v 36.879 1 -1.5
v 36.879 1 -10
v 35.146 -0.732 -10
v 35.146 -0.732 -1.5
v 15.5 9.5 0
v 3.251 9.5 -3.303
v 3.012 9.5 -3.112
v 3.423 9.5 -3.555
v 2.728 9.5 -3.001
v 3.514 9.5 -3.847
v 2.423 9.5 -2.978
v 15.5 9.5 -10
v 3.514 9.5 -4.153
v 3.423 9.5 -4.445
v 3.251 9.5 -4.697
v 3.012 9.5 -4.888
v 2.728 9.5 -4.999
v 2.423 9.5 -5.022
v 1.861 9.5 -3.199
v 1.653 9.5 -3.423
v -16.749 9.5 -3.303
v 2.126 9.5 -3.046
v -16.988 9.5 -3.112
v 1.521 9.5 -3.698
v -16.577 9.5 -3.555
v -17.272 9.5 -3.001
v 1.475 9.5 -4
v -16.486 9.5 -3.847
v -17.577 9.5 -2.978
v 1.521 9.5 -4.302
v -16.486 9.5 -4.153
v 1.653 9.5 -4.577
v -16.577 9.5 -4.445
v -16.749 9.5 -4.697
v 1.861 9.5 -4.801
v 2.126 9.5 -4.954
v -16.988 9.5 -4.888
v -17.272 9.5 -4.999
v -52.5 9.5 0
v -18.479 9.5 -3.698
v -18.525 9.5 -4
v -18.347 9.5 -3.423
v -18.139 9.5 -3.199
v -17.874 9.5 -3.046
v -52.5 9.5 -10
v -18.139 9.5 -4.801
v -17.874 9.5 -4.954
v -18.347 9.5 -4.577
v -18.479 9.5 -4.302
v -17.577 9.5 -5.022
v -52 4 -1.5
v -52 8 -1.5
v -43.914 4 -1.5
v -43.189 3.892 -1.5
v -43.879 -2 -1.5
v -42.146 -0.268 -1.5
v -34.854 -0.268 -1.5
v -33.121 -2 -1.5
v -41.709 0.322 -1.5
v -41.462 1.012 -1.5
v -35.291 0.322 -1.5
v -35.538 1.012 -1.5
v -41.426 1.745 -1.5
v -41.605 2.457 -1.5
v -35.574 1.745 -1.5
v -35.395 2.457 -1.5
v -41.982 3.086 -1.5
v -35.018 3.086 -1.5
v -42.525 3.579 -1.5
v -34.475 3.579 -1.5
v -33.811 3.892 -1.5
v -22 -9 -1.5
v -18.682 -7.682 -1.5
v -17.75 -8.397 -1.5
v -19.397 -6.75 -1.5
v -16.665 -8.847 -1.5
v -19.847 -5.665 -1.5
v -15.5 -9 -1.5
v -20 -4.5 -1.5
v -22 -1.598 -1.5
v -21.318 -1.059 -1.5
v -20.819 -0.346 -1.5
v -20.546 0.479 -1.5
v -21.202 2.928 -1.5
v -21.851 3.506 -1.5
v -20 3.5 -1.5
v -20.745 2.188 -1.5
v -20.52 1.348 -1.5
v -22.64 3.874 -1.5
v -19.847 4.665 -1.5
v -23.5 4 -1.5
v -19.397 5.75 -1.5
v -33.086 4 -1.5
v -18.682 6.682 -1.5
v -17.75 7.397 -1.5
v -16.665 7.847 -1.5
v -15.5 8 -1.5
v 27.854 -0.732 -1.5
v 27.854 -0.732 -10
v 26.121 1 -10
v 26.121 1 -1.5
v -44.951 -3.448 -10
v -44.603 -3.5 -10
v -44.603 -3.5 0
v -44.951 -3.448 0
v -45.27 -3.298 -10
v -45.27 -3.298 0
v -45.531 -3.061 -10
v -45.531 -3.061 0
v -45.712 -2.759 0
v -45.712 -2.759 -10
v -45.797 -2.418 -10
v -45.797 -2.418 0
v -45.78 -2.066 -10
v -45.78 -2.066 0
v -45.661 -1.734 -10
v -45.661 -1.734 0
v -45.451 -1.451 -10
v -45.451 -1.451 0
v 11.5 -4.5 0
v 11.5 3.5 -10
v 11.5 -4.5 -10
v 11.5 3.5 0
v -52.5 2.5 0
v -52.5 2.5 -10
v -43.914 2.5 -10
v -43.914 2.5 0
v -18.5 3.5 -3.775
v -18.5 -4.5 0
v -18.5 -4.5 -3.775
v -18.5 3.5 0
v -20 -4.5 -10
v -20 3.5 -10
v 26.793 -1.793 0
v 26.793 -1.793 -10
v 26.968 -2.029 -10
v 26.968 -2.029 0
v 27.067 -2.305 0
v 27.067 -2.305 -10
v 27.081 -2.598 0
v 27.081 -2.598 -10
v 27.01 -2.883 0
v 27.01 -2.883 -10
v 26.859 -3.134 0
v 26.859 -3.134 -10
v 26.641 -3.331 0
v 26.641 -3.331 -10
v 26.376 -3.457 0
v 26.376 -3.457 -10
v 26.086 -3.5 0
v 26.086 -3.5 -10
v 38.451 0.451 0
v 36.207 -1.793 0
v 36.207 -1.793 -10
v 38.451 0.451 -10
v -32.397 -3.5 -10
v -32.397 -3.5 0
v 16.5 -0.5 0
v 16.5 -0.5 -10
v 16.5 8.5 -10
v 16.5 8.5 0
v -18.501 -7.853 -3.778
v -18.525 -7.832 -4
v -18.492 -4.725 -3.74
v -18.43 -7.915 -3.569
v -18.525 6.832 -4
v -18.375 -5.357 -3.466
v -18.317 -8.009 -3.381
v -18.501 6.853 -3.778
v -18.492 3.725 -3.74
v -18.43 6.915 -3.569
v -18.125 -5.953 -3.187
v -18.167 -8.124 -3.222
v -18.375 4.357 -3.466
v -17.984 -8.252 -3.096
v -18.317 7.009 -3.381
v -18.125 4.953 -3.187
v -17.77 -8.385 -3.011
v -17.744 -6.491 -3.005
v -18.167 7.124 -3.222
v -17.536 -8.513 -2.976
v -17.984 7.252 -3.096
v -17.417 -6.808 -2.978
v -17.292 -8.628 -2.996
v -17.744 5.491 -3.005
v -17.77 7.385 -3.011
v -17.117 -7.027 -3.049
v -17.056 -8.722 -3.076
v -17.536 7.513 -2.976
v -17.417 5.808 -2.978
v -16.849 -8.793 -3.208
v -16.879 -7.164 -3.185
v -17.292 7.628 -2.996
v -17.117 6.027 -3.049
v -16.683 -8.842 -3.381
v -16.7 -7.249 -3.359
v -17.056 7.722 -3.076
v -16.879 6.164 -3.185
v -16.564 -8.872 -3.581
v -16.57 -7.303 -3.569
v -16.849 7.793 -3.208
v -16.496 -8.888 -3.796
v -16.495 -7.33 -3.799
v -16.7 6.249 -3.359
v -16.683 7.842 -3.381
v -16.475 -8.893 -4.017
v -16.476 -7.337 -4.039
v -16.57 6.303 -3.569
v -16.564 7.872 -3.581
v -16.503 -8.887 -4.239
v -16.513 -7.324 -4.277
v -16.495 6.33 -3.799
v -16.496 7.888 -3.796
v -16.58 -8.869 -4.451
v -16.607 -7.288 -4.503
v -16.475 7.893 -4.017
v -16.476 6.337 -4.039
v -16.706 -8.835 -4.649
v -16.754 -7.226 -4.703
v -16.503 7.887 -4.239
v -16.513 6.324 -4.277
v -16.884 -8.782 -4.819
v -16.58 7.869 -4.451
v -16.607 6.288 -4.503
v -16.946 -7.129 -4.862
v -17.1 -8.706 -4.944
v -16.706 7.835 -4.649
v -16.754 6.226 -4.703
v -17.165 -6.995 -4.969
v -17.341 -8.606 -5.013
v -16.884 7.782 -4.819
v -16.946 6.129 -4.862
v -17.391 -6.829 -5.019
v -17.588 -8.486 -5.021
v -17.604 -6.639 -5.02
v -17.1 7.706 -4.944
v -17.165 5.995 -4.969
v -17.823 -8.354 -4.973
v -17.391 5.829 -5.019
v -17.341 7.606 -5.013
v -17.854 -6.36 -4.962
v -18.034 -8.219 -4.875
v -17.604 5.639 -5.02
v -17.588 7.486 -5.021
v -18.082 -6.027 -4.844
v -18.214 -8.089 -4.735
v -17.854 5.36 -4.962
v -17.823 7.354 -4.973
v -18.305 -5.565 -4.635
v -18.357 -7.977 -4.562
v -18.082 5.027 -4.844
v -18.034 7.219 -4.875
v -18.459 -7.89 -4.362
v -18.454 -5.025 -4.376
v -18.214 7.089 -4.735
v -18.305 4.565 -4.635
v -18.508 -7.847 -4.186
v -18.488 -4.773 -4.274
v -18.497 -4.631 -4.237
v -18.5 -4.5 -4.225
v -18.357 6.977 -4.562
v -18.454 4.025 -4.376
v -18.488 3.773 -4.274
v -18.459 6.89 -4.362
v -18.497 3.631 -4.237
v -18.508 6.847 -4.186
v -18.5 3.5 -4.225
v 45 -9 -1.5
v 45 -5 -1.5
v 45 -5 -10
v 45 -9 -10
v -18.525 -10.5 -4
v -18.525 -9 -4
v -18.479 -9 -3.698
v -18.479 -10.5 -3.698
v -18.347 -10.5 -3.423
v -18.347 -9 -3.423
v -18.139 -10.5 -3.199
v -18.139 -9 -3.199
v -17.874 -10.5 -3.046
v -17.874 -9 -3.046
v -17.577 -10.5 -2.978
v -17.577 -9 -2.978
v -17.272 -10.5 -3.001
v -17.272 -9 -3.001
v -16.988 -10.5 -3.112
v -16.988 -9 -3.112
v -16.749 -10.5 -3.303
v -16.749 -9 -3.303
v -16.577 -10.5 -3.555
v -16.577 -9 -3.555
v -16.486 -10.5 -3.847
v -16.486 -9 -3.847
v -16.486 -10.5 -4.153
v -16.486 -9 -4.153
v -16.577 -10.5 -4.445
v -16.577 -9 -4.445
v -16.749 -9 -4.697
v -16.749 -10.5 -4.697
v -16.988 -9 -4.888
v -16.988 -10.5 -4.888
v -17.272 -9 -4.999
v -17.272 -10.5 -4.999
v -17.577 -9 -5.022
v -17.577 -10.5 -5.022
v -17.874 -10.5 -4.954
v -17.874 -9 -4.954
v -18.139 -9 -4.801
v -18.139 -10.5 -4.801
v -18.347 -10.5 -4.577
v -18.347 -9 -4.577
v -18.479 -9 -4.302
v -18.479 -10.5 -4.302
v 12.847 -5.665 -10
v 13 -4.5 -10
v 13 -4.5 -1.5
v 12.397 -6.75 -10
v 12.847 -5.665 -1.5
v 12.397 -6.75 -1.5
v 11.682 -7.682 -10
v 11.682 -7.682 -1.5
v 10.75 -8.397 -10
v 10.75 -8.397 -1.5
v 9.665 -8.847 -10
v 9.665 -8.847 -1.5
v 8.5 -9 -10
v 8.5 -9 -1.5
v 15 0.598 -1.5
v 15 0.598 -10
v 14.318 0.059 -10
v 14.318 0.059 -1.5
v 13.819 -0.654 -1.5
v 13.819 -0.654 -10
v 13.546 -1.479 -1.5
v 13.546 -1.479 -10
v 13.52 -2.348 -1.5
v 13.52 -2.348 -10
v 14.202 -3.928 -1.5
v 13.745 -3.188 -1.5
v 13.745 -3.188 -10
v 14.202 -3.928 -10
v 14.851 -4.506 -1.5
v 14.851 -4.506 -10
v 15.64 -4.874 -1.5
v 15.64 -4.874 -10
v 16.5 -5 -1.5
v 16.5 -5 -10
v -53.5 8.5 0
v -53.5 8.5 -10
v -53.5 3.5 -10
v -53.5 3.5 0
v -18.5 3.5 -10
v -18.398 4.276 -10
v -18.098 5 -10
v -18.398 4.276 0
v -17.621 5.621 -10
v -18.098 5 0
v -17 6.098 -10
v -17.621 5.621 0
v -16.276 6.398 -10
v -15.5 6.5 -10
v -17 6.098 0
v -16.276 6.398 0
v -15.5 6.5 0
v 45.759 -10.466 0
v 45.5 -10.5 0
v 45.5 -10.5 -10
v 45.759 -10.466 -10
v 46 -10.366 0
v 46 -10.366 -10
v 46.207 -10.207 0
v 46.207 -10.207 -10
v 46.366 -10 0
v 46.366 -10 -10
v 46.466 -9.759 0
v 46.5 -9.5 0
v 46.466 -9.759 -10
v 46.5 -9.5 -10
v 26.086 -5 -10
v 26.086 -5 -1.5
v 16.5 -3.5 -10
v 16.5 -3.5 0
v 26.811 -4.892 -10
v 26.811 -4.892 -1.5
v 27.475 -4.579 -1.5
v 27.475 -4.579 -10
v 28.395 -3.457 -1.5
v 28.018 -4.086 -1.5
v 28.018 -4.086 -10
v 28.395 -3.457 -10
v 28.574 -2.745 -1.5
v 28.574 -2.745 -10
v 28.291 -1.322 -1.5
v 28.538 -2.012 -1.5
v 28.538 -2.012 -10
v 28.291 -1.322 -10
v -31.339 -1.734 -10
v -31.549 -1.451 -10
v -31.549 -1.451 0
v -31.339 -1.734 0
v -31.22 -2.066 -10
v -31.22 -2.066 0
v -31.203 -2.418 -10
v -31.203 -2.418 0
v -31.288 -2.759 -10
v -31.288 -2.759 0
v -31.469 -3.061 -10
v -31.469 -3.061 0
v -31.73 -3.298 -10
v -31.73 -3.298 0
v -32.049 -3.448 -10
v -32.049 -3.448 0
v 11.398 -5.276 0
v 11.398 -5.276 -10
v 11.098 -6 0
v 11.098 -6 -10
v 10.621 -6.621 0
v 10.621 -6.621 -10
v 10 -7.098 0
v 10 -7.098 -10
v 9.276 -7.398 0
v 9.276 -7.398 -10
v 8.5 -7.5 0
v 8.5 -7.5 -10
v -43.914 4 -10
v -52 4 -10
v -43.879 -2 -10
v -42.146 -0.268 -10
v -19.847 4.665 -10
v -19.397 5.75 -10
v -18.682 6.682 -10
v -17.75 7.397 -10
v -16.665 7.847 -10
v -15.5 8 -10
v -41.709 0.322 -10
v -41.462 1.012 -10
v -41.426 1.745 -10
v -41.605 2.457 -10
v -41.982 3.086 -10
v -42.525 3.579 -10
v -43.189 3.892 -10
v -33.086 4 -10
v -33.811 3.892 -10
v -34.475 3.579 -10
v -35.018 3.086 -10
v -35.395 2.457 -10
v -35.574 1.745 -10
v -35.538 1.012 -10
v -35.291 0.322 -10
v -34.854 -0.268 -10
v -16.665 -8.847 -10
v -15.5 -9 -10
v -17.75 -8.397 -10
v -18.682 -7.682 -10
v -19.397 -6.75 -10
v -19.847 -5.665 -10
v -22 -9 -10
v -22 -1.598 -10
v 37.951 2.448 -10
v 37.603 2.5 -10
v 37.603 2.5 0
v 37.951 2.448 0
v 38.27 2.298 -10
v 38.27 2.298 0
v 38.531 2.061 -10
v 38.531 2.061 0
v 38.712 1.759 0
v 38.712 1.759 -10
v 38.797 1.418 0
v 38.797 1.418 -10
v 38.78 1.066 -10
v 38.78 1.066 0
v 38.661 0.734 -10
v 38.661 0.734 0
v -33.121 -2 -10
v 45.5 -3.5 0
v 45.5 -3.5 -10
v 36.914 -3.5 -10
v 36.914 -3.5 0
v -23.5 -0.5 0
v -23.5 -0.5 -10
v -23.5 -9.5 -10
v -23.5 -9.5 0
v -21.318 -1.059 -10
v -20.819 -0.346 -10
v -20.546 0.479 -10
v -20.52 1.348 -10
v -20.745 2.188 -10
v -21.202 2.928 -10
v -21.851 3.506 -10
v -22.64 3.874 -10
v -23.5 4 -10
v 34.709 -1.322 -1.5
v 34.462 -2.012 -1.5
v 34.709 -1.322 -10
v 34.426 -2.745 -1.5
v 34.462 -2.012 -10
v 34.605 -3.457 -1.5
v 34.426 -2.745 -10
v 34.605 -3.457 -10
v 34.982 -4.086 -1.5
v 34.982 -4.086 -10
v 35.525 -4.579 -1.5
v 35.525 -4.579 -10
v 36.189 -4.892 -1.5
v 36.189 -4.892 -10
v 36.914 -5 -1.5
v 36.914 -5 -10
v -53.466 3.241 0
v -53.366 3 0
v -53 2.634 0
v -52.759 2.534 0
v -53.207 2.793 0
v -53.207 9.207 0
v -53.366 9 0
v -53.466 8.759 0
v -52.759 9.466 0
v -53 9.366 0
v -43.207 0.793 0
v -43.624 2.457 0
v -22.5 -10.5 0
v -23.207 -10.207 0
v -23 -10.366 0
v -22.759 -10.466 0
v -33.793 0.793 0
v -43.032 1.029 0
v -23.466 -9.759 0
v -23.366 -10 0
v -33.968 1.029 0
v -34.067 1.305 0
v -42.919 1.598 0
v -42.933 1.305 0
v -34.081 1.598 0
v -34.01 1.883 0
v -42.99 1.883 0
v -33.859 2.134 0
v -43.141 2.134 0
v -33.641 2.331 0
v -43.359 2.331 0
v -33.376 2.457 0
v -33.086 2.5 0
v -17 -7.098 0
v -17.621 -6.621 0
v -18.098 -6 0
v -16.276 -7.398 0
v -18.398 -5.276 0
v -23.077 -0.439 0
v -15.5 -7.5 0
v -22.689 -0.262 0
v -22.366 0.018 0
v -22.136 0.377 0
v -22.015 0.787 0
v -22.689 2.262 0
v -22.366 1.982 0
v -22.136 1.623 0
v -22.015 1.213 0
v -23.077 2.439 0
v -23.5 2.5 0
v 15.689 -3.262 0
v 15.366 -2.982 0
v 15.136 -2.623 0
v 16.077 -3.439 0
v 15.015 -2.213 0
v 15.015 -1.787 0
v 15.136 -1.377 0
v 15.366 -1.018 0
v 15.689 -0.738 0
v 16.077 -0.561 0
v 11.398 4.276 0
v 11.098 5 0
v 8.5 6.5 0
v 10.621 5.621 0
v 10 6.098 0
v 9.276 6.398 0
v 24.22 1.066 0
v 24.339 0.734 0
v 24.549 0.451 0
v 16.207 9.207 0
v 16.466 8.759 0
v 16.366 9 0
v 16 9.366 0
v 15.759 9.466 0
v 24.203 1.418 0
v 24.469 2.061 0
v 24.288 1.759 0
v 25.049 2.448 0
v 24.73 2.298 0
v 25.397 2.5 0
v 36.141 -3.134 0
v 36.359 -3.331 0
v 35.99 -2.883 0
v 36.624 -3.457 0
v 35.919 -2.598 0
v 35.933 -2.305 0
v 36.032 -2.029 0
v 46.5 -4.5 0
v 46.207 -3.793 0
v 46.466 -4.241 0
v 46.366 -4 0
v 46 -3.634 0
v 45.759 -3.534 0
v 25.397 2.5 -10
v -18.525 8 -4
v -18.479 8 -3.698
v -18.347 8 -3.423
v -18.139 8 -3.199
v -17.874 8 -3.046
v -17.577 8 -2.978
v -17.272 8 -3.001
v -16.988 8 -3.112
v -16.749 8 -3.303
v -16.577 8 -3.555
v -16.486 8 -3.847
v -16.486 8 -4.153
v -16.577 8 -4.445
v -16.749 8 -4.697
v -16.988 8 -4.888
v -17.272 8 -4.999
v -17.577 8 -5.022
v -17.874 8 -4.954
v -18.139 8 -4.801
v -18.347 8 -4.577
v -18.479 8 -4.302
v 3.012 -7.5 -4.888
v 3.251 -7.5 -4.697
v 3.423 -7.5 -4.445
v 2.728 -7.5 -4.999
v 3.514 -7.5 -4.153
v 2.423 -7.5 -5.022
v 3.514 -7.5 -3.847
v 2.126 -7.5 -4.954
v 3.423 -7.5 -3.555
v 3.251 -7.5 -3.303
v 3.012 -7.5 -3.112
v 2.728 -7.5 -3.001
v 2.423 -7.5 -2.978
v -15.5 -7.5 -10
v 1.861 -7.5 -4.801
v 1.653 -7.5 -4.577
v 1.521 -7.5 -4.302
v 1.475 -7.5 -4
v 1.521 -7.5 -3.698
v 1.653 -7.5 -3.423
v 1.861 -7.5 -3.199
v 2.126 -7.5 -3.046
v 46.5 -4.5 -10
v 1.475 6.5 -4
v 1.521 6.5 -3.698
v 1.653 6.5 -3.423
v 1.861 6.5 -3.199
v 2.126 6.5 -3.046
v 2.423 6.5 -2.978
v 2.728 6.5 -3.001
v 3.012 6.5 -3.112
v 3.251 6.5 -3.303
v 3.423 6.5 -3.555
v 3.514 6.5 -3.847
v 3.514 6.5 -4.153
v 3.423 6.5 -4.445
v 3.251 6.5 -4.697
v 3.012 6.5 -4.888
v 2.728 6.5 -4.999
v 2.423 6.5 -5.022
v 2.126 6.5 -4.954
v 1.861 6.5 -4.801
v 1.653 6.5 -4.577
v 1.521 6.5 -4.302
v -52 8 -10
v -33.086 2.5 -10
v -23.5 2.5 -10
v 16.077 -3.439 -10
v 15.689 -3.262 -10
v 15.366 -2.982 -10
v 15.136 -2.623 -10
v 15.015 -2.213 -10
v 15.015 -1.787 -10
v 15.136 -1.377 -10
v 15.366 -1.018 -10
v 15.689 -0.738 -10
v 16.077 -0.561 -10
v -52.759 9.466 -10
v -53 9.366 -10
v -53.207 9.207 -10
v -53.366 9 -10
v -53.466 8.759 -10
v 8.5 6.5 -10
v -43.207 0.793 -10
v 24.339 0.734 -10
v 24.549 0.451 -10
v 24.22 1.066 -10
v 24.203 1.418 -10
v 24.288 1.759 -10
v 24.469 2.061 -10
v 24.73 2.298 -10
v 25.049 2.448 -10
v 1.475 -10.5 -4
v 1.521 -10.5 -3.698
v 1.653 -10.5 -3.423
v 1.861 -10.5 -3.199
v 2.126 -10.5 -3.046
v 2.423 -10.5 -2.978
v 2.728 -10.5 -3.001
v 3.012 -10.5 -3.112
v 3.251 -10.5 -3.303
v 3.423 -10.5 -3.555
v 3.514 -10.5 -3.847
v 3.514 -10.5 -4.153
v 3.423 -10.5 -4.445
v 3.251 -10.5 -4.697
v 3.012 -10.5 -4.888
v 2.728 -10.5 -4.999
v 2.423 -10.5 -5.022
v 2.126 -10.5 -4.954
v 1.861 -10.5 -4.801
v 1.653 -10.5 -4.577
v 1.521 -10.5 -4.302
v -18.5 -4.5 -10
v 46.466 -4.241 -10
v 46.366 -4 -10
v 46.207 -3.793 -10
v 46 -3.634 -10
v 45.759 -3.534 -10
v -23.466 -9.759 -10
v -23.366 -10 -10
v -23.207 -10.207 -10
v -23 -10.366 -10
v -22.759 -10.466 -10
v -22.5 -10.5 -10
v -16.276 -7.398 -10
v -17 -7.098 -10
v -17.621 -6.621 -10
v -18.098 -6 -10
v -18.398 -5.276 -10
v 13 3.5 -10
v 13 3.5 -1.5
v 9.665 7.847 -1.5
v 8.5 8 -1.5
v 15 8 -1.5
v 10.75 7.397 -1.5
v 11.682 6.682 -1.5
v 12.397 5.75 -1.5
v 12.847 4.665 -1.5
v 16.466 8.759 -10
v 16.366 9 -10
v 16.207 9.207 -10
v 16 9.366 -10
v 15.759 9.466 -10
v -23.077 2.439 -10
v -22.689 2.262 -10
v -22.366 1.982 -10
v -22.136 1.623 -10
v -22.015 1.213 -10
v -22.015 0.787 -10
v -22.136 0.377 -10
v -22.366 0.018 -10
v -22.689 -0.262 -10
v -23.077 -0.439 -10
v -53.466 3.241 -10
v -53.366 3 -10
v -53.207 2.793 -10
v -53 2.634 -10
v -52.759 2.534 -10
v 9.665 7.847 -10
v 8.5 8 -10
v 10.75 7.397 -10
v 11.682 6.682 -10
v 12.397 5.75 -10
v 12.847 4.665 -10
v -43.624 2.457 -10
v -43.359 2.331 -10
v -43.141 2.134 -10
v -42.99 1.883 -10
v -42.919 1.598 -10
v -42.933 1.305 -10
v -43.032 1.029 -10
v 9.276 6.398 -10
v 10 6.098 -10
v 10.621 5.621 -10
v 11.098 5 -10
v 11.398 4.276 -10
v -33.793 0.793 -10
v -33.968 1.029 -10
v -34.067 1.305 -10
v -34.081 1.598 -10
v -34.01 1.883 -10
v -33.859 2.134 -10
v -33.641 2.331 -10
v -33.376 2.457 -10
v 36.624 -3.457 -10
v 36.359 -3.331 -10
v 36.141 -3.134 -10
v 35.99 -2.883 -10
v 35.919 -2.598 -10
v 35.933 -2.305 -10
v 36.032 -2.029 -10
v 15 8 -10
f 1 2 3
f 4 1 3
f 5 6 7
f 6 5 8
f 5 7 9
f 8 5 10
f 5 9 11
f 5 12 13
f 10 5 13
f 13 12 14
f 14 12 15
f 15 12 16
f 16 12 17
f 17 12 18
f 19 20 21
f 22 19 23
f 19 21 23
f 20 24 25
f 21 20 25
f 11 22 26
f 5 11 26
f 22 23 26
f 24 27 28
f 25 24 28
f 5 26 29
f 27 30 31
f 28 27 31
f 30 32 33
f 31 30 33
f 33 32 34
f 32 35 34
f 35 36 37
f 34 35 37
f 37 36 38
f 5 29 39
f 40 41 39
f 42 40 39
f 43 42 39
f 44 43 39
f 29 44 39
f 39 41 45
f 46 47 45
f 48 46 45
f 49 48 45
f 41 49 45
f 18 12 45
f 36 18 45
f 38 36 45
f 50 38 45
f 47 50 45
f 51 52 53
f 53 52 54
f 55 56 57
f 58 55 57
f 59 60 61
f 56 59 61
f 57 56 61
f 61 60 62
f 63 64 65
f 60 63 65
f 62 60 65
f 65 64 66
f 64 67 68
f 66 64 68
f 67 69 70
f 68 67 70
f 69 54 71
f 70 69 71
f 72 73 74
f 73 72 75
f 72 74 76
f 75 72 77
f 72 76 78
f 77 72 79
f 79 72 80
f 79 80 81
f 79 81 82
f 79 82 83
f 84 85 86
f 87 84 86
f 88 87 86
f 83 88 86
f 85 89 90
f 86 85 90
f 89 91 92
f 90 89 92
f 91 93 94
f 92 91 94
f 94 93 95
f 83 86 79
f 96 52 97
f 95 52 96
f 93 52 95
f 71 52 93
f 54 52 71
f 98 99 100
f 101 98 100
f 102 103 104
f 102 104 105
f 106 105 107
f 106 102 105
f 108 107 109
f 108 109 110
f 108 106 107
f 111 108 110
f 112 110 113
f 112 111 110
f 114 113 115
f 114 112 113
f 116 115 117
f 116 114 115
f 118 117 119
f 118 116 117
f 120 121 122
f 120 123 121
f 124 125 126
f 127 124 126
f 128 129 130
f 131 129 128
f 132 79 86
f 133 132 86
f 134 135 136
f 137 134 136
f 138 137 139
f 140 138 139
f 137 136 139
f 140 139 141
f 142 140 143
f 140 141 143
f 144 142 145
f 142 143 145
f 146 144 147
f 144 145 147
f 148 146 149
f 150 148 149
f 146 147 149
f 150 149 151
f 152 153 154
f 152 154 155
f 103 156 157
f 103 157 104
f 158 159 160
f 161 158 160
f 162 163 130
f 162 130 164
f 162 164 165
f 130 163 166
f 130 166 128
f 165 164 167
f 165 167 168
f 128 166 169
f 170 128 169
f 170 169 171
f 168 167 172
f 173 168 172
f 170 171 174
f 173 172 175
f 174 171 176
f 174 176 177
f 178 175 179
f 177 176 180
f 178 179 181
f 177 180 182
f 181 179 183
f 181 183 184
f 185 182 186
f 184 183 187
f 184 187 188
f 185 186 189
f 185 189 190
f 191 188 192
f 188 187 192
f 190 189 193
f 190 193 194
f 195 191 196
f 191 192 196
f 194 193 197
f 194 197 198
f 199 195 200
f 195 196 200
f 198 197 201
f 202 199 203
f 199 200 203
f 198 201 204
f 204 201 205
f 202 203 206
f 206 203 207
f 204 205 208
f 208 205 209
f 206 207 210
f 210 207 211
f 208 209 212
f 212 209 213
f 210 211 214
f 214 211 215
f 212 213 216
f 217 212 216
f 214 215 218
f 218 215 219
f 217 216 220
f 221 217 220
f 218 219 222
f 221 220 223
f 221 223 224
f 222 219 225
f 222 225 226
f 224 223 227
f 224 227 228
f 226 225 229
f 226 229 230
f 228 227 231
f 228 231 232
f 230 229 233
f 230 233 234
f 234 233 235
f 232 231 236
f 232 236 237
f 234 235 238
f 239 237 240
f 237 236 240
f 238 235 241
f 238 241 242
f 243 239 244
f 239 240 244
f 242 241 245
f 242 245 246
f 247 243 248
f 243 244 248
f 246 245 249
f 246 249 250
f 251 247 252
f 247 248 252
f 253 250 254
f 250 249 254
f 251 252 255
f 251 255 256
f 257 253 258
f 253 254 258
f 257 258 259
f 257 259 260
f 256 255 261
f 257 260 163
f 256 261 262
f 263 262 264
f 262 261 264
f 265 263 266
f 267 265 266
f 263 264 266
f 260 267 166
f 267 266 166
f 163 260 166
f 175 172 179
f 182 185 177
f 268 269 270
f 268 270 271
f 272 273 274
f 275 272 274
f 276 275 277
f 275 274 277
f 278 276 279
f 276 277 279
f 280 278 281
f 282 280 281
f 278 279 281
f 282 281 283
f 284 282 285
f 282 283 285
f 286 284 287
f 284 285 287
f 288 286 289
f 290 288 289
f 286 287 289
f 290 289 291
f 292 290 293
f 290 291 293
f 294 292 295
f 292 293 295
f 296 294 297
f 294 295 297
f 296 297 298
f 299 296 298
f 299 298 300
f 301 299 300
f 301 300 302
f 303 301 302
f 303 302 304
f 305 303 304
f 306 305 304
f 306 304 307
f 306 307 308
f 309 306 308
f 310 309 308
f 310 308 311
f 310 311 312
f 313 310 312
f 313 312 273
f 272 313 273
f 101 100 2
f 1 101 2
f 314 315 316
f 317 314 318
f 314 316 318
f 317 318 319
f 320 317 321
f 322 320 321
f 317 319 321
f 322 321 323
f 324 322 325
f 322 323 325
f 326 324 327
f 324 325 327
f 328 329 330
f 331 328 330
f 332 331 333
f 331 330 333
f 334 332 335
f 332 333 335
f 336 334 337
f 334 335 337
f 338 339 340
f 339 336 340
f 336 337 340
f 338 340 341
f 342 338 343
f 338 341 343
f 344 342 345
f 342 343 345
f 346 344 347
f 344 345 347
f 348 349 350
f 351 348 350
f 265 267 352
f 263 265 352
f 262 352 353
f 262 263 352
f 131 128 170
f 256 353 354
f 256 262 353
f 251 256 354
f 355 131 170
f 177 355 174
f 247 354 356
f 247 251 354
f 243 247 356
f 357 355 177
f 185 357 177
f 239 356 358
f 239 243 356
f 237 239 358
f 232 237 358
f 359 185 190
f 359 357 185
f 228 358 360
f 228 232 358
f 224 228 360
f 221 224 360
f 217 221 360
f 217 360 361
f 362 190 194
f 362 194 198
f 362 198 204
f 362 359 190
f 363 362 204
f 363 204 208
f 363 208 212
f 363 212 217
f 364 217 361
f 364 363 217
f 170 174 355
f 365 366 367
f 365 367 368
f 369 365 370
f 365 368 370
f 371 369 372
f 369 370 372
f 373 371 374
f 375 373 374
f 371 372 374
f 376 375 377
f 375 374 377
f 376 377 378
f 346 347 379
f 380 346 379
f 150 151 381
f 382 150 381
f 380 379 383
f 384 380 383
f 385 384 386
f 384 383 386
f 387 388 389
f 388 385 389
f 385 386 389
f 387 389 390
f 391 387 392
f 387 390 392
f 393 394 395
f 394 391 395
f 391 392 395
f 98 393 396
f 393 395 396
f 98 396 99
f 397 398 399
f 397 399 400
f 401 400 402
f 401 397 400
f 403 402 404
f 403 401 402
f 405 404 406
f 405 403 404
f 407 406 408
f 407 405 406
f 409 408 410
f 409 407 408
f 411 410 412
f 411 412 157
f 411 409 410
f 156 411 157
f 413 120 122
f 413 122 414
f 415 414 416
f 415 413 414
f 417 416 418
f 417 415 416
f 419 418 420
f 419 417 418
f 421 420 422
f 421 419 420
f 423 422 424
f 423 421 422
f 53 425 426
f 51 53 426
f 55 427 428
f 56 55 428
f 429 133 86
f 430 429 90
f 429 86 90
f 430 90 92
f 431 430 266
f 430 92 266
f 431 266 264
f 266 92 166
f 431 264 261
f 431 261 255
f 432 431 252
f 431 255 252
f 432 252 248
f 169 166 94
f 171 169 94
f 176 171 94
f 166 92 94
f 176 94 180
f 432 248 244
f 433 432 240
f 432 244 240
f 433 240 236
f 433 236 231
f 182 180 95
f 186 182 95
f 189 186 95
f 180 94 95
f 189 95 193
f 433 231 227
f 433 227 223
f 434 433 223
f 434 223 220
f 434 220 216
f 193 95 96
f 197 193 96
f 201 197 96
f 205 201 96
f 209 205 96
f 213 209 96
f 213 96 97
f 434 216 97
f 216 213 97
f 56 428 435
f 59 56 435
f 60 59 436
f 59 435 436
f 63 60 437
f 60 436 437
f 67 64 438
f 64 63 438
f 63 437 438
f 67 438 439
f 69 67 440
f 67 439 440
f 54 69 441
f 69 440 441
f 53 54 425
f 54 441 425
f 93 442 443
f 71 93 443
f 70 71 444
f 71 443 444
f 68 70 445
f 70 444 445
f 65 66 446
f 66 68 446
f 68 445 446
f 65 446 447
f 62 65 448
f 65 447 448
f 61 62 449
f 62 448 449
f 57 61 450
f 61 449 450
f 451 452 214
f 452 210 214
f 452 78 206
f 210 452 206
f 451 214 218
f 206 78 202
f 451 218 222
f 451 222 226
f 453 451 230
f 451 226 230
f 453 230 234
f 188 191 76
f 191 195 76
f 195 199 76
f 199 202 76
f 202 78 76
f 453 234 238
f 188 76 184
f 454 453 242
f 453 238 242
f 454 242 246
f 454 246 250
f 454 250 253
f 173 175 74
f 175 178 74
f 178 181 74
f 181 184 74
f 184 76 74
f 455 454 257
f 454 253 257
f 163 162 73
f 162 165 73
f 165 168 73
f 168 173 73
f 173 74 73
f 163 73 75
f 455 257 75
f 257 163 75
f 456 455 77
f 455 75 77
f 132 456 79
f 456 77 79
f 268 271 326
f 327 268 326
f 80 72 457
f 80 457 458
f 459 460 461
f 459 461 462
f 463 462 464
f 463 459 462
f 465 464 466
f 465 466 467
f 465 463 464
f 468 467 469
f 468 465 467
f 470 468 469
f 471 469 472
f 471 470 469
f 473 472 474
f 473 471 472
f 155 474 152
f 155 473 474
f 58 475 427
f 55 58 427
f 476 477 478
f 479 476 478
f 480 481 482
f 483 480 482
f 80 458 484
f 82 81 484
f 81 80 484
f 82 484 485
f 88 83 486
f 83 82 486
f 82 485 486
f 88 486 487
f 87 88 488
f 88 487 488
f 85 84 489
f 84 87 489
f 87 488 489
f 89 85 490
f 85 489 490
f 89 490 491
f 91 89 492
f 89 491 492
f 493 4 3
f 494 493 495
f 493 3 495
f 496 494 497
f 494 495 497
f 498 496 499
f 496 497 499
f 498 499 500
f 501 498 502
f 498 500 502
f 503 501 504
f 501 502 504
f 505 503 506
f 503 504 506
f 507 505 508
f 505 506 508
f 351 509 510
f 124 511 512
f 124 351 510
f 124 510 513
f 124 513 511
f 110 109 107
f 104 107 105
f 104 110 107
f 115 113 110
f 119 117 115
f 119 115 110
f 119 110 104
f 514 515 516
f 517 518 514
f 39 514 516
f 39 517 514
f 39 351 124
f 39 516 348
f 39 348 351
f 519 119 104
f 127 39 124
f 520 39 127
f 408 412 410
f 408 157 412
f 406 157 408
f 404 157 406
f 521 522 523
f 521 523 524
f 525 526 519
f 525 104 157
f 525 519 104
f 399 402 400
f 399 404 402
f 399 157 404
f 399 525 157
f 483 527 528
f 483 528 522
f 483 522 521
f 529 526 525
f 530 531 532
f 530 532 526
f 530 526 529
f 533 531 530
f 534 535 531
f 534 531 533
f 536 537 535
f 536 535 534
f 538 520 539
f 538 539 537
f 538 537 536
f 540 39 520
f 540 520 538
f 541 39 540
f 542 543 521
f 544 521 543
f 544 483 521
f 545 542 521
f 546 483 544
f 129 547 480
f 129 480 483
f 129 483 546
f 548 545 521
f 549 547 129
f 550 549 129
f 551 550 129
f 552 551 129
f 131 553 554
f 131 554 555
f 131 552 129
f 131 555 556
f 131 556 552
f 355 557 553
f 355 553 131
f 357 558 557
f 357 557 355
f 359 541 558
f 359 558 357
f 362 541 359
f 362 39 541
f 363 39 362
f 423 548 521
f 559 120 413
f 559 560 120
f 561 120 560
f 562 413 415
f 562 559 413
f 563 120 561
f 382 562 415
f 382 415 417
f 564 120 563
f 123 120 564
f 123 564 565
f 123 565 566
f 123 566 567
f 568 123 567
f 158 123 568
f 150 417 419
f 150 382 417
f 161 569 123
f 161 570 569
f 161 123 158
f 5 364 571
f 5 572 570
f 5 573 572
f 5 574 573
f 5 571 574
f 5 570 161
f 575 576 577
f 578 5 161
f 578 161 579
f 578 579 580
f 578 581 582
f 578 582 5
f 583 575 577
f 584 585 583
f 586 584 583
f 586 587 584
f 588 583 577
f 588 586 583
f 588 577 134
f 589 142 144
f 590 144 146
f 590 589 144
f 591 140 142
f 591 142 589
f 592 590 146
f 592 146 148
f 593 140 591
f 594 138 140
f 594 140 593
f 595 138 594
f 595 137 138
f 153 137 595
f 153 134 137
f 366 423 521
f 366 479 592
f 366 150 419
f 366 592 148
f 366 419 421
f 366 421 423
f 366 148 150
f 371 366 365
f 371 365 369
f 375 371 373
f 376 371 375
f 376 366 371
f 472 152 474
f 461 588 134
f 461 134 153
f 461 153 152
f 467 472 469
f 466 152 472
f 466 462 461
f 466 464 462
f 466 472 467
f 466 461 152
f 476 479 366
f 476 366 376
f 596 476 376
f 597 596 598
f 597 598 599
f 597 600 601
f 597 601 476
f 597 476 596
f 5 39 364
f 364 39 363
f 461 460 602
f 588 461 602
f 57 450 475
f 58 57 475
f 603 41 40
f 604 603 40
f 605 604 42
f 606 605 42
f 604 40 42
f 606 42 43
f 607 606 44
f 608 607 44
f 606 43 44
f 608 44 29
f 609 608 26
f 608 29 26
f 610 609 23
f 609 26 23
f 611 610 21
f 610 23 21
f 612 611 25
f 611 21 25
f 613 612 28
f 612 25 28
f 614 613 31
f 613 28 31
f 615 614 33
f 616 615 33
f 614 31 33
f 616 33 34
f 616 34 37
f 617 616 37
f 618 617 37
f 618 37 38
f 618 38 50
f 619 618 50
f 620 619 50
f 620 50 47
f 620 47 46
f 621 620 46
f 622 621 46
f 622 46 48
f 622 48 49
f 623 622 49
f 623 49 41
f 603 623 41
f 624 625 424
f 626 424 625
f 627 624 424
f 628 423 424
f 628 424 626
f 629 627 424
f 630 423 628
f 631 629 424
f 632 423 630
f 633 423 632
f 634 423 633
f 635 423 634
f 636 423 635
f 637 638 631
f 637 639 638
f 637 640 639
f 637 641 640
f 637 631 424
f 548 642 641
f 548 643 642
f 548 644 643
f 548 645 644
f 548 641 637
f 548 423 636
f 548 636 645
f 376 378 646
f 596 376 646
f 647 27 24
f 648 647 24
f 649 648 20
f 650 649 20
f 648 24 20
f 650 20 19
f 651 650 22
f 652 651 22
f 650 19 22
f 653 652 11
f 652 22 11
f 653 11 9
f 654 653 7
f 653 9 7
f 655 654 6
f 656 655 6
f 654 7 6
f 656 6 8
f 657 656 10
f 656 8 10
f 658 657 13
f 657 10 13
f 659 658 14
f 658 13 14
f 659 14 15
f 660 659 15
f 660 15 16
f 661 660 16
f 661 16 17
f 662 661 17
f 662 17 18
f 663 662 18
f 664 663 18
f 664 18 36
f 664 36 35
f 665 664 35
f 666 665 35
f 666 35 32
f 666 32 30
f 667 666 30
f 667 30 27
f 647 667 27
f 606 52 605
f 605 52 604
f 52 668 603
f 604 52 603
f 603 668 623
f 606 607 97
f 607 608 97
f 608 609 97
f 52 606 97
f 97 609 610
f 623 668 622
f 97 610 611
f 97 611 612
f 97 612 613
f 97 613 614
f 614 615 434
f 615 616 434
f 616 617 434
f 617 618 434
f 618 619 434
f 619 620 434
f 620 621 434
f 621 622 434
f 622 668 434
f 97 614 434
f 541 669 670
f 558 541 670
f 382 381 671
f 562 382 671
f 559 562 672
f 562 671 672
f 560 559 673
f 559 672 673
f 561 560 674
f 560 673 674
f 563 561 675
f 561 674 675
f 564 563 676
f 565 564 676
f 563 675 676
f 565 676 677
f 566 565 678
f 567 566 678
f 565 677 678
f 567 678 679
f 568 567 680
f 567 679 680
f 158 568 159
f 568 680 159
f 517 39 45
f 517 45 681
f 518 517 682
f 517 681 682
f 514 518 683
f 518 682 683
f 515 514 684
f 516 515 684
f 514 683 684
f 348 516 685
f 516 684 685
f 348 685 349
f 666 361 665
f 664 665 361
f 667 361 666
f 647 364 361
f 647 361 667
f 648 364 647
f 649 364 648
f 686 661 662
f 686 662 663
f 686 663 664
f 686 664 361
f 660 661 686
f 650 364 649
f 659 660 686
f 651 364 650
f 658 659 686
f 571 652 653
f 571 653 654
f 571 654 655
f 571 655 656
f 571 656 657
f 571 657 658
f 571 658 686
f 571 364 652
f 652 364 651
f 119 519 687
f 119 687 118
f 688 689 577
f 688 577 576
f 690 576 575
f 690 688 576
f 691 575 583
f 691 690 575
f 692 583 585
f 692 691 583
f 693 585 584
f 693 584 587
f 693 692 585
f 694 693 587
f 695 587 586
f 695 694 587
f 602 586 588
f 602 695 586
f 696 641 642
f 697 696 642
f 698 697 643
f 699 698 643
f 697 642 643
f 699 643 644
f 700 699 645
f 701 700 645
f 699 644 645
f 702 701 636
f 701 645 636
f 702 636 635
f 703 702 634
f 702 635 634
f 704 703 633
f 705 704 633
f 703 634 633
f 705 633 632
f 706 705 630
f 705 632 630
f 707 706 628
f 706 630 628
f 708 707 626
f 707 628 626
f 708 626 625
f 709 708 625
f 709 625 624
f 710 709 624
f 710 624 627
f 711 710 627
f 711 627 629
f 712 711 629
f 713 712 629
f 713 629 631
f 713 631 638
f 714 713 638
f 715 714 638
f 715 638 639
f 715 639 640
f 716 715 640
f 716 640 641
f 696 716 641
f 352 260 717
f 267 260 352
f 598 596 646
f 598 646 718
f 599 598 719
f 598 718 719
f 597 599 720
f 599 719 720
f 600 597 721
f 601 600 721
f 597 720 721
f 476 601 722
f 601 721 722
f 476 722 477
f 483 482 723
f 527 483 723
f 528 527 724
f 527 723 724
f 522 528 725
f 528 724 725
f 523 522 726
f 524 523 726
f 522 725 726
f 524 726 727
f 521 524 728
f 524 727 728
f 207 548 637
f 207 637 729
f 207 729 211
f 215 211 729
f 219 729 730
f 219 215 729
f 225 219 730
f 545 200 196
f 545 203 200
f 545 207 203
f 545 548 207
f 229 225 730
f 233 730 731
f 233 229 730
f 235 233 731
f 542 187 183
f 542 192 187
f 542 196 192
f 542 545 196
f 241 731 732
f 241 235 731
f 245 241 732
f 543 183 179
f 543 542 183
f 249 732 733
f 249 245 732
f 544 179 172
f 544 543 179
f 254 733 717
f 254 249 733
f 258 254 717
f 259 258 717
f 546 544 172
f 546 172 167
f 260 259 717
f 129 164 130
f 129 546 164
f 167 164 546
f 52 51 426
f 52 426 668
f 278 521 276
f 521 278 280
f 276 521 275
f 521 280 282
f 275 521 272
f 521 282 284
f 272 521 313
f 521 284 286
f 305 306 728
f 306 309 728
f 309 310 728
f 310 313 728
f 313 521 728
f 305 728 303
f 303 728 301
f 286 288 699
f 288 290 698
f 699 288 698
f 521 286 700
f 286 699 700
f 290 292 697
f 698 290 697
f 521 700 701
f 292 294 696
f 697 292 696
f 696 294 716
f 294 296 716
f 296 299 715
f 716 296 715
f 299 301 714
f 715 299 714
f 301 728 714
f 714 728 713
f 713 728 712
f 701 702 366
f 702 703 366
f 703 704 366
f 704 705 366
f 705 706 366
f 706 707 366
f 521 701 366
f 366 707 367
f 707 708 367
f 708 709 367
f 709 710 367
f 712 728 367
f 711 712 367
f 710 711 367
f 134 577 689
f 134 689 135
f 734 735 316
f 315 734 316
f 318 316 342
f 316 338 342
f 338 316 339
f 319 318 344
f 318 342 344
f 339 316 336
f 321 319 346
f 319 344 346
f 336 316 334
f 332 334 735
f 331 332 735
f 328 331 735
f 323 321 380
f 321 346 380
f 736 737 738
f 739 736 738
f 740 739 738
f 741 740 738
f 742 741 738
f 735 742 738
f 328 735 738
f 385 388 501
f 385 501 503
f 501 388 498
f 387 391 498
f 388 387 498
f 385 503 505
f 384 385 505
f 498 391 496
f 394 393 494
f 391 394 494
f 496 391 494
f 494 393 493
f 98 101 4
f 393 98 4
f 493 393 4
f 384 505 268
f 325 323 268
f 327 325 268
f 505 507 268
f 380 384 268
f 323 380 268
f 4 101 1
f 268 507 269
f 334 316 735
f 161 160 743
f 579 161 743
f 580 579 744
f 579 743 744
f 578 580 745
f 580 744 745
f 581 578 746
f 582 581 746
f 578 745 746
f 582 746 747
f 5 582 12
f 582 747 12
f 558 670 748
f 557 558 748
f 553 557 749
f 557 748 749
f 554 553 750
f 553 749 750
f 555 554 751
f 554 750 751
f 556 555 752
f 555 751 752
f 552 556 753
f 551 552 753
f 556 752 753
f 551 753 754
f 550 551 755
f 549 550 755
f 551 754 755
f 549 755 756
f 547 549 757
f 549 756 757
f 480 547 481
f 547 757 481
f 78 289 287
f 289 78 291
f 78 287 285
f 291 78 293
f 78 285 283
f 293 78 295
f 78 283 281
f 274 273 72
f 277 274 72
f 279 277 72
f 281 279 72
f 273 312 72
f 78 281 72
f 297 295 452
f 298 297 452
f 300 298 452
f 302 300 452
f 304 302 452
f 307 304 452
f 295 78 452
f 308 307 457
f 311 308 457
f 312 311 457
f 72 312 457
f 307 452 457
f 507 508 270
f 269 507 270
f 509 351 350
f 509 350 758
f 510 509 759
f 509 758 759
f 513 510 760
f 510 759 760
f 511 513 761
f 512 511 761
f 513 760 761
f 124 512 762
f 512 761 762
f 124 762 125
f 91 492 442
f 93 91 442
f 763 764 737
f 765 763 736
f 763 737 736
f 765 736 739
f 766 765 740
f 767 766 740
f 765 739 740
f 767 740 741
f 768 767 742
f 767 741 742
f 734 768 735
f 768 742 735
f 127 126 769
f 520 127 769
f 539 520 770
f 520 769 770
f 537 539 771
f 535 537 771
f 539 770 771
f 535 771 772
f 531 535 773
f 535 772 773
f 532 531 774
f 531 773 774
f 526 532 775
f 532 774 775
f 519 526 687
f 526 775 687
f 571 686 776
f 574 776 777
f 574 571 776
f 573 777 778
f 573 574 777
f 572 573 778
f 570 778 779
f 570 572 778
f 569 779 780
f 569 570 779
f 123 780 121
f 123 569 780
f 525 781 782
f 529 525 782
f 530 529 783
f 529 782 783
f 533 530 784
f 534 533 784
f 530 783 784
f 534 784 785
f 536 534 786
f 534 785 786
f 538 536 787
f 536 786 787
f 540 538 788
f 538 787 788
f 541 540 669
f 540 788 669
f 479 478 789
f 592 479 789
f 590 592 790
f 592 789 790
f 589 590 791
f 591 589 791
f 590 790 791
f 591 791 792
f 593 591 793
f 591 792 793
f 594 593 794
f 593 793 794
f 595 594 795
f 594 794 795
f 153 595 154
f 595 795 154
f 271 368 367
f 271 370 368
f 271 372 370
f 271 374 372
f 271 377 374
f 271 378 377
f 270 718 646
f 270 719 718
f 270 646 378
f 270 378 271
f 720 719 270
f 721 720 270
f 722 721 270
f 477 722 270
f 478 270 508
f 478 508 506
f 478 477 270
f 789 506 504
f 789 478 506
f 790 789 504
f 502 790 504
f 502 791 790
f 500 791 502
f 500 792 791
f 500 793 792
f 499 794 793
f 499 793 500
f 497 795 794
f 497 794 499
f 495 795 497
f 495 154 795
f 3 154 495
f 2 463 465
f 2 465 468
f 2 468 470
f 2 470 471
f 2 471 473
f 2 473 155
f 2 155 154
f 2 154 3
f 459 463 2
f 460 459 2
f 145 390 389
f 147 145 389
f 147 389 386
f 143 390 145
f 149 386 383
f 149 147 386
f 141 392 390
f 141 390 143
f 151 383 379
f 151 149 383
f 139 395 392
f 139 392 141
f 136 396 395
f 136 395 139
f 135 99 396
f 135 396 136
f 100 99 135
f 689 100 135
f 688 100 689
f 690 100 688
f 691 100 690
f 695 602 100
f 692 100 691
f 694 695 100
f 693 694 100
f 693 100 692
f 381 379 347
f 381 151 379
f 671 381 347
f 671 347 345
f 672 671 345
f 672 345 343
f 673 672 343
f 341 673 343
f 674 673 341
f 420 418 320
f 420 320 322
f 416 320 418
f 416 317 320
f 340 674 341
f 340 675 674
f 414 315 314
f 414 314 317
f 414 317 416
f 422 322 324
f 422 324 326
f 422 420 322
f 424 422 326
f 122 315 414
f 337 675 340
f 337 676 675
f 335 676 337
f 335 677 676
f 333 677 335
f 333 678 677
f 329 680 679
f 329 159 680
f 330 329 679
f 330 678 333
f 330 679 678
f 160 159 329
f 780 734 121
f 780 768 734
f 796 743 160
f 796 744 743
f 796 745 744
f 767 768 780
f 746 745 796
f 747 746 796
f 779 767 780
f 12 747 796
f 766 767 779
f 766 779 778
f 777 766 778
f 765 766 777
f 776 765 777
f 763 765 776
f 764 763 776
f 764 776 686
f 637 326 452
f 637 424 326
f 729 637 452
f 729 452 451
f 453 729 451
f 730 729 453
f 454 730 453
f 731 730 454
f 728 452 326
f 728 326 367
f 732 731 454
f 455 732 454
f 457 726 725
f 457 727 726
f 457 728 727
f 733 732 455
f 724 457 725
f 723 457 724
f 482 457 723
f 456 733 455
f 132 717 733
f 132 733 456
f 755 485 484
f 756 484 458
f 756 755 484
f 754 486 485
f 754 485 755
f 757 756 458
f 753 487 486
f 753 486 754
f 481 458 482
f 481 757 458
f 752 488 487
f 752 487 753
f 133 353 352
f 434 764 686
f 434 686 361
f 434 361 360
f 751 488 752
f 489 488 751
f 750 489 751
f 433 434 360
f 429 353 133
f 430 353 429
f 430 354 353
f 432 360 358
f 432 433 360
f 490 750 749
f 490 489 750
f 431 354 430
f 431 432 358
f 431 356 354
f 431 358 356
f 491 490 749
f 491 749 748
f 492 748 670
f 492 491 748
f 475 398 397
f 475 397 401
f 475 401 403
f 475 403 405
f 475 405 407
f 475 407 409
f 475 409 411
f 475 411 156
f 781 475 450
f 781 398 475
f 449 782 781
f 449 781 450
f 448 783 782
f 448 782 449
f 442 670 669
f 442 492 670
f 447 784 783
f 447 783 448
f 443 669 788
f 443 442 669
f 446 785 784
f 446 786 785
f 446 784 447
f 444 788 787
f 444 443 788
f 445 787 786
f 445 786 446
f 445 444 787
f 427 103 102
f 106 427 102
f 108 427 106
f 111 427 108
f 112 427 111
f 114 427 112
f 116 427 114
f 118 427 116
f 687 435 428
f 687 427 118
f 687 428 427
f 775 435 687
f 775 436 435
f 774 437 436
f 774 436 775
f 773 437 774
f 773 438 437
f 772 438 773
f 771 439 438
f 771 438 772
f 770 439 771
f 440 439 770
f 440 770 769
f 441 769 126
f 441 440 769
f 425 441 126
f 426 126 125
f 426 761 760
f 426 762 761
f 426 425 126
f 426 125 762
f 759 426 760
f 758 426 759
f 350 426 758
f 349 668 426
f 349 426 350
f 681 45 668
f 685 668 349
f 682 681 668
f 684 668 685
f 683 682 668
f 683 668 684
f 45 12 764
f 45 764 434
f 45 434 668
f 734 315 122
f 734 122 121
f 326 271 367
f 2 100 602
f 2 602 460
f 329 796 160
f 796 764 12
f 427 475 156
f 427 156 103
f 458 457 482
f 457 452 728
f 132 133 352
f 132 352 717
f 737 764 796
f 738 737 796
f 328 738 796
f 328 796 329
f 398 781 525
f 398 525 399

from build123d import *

# Parameters (mm, degrees)
ABS_ZWING_MIRRORED_START      = -10
ABS_ZWING_MIRRORED_DEPTH      = 10
ABS_ZWING_MIRRORED_START_2    = -1.5
ABS_ZWING_MIRRORED_2_DEPTH    = 1.5
SKETCH1_W                     = 30
SKETCH1_H                     = 14
CUT_EXTRUDE1_DEPTH            = 10
FILLET1_R                     = 3
BOSS_EXTRUDE2_DEPTH           = 8.5
CUT_EXTRUDE2_DEPTH            = 10
TAP_DRILL_FOR_M2_5_TAP1_D     = 2.05
TAP_DRILL_FOR_M2_5_TAP1_DEPTH = 30.5


# Read off the part's stored shape, not the designer's step: abs_zwing_Mirrored
with BuildPart() as part:
    # abs_zwing_Mirrored outline → abs_zwing_Mirrored (new body)
    with BuildSketch(Plane.XY.offset(ABS_ZWING_MIRRORED_START)):
        with BuildLine():
            ThreePointArc((-23.5, 2.5), (-22, 1), (-23.5, -0.5))
            Line((-23.5, -0.5), (-23.5, -9.5))
            ThreePointArc((-23.5, -9.5), (-23.207106781, -10.207106781), (-22.5, -10.5))
            Line((-22.5, -10.5), (45.5, -10.5))
            ThreePointArc((45.5, -10.5), (46.207106781, -10.207106781), (46.5, -9.5))
            Line((46.5, -9.5), (46.5, -4.5))
            ThreePointArc((46.5, -4.5), (46.207106781, -3.792893219), (45.5, -3.5))
            Line((45.5, -3.5), (36.914213562, -3.5))
            ThreePointArc((36.914213562, -3.5), (35.99033403, -2.882683432), (36.207106781, -1.792893219))
            Line((36.207106781, -1.792893219), (38.792893219, 0.792893219))
            ThreePointArc((38.792893219, 0.792893219), (39.00966597, 1.882683432), (38.085786438, 2.5))
            Line((38.085786438, 2.5), (24.914213562, 2.5))
            ThreePointArc((24.914213562, 2.5), (23.99033403, 1.882683432), (24.207106781, 0.792893219))
            Line((24.207106781, 0.792893219), (26.792893219, -1.792893219))
            ThreePointArc((26.792893219, -1.792893219), (27.00966597, -2.882683432), (26.085786438, -3.5))
            Line((26.085786438, -3.5), (16.5, -3.5))
            ThreePointArc((16.5, -3.5), (15, -2), (16.5, -0.5))
            Line((16.5, -0.5), (16.5, 8.5))
            ThreePointArc((16.5, 8.5), (16.207106781, 9.207106781), (15.5, 9.5))
            Line((15.5, 9.5), (-52.5, 9.5))
            ThreePointArc((-52.5, 9.5), (-53.207106781, 9.207106781), (-53.5, 8.5))
            Line((-53.5, 8.5), (-53.5, 3.5))
            ThreePointArc((-53.5, 3.5), (-53.207106781, 2.792893219), (-52.5, 2.5))
            Line((-52.5, 2.5), (-43.914213562, 2.5))
            ThreePointArc((-43.914213562, 2.5), (-42.99033403, 1.882683432), (-43.207106781, 0.792893219))
            Line((-43.207106781, 0.792893219), (-45.792893219, -1.792893219))
            ThreePointArc((-45.792893219, -1.792893219), (-46.00966597, -2.882683432), (-45.085786438, -3.5))
            Line((-45.085786438, -3.5), (-31.914213562, -3.5))
            ThreePointArc((-31.914213562, -3.5), (-30.99033403, -2.882683432), (-31.207106781, -1.792893219))
            Line((-31.207106781, -1.792893219), (-33.792893219, 0.792893219))
            ThreePointArc((-33.792893219, 0.792893219), (-34.00966597, 1.882683432), (-33.085786438, 2.5))
            Line((-33.085786438, 2.5), (-23.5, 2.5))
        make_face()
        with BuildLine():
            ThreePointArc((-22, -1.598076211), (-20.602222521, 1.776457136), (-23.5, 4))
            Line((-23.5, 4), (-33.085786438, 4))
            ThreePointArc((-33.085786438, 4), (-35.395485269, 2.456708581), (-34.853553391, -0.267766953))
            Line((-34.853553391, -0.267766953), (-33.121320344, -2))
            Line((-33.121320344, -2), (-43.878679656, -2))
            Line((-43.878679656, -2), (-42.146446609, -0.267766953))
            ThreePointArc((-42.146446609, -0.267766953), (-41.604514731, 2.456708581), (-43.914213562, 4))
            Line((-43.914213562, 4), (-52, 4))
            Line((-52, 4), (-52, 8))
            Line((-52, 8), (15, 8))
            Line((15, 8), (15, 0.598076211))
            ThreePointArc((15, 0.598076211), (13.602222521, -2.776457136), (16.5, -5))
            Line((16.5, -5), (26.085786438, -5))
            ThreePointArc((26.085786438, -5), (28.395485269, -3.456708581), (27.853553391, -0.732233047))
            Line((27.853553391, -0.732233047), (26.121320344, 1))
            Line((26.121320344, 1), (36.878679656, 1))
            Line((36.878679656, 1), (35.146446609, -0.732233047))
            ThreePointArc((35.146446609, -0.732233047), (34.604514731, -3.456708581), (36.914213562, -5))
            Line((36.914213562, -5), (45, -5))
            Line((45, -5), (45, -9))
            Line((45, -9), (-22, -9))
            Line((-22, -9), (-22, -1.598076211))
        make_face(mode=Mode.SUBTRACT)
    extrude(amount=ABS_ZWING_MIRRORED_DEPTH)

    # abs_zwing_Mirrored 2 outline → abs_zwing_Mirrored 2 (add)
    with BuildSketch(Plane.XY.offset(ABS_ZWING_MIRRORED_START_2)):
        with BuildLine():
            Line((-33.085786438, 4), (-23.5, 4))
            ThreePointArc((-23.5, 4), (-20.602222521, 1.776457136), (-22, -1.598076211))
            Line((-22, -1.598076211), (-22, -9))
            Line((-22, -9), (45, -9))
            Line((45, -9), (45, -5))
            Line((45, -5), (36.914213562, -5))
            ThreePointArc((36.914213562, -5), (34.604514731, -3.456708581), (35.146446609, -0.732233047))
            Line((35.146446609, -0.732233047), (36.878679656, 1))
            Line((36.878679656, 1), (26.121320344, 1))
            Line((26.121320344, 1), (27.853553391, -0.732233047))
            ThreePointArc((27.853553391, -0.732233047), (28.395485269, -3.456708581), (26.085786438, -5))
            Line((26.085786438, -5), (16.5, -5))
            ThreePointArc((16.5, -5), (13.602222521, -2.776457136), (15, 0.598076211))
            Line((15, 0.598076211), (15, 8))
            Line((15, 8), (-52, 8))
            Line((-52, 8), (-52, 4))
            Line((-52, 4), (-43.914213562, 4))
            ThreePointArc((-43.914213562, 4), (-41.604514731, 2.456708581), (-42.146446609, -0.267766953))
            Line((-42.146446609, -0.267766953), (-43.878679656, -2))
            Line((-43.878679656, -2), (-33.121320344, -2))
            Line((-33.121320344, -2), (-34.853553391, -0.267766953))
            ThreePointArc((-34.853553391, -0.267766953), (-35.395485269, 2.456708581), (-33.085786438, 4))
        make_face()
    extrude(amount=ABS_ZWING_MIRRORED_2_DEPTH)

    # Sketch1 → Cut-Extrude1 (cut)
    with BuildSketch(Plane(origin=(0, 0, -1.5), x_dir=(-1, 0, 0), z_dir=(0, 0, -1))):
        with Locations((3.5, -0.5)):
            Rectangle(SKETCH1_W, SKETCH1_H)
    extrude(amount=-CUT_EXTRUDE1_DEPTH, mode=Mode.SUBTRACT)

    # Fillet1
    fillet1_edges = [part.edges().sort_by_distance(p)[0] for p in [
        (11.5, -7.5, -0.75),
        (11.5, 6.5, -0.75),
        (-18.5, 6.5, -0.75),
        (-18.5, -7.5, -0.75),
    ]]
    fillet(fillet1_edges, radius=FILLET1_R)

    # Sketch4 → Boss-Extrude2 (add)
    with BuildSketch(Plane(origin=(0, 0, -1.5), x_dir=(-1, 0, 0), z_dir=(0, 0, -1))):
        with BuildLine():
            Line((-13, 3.5), (-13, -4.5))
            ThreePointArc((-13, -4.5), (-11.681980515, -7.681980515), (-8.5, -9))
            Line((-8.5, -9), (15.5, -9))
            ThreePointArc((15.5, -9), (18.681980515, -7.681980515), (20, -4.5))
            Line((20, -4.5), (20, 3.5))
            ThreePointArc((20, 3.5), (18.681980515, 6.681980515), (15.5, 8))
            Line((15.5, 8), (-8.5, 8))
            ThreePointArc((-8.5, 8), (-11.681980515, 6.681980515), (-13, 3.5))
        make_face()
        with BuildLine():
            Line((-11.5, 3.5), (-11.5, -4.5))
            ThreePointArc((-11.5, -4.5), (-10.621320344, -6.621320344), (-8.5, -7.5))
            Line((-8.5, -7.5), (15.5, -7.5))
            ThreePointArc((15.5, -7.5), (17.621320344, -6.621320344), (18.5, -4.5))
            Line((18.5, -4.5), (18.5, 3.5))
            ThreePointArc((18.5, 3.5), (17.621320344, 5.621320344), (15.5, 6.5))
            Line((15.5, 6.5), (-8.5, 6.5))
            ThreePointArc((-8.5, 6.5), (-10.621320344, 5.621320344), (-11.5, 3.5))
        make_face(mode=Mode.SUBTRACT)
    extrude(amount=BOSS_EXTRUDE2_DEPTH)

    # Sketch8 → Cut-Extrude2 (cut)
    with BuildSketch(Plane(origin=(0, 0, -10), x_dir=(-1, 0, 0), z_dir=(0, 0, -1))):
        with BuildLine():
            Line((-38.451471863, 0.451471863), (-40.5, 2.5))
            Line((-40.5, 2.5), (-37.602943725, 2.5))
            ThreePointArc((-37.602943725, 2.5), (-38.711599164, 1.759220119), (-38.451471863, 0.451471863))
        make_face()
        with BuildLine():
            Line((-25.397056275, 2.5), (-22.5, 2.5))
            Line((-22.5, 2.5), (-24.548528137, 0.451471863))
            ThreePointArc((-24.548528137, 0.451471863), (-24.288400836, 1.759220119), (-25.397056275, 2.5))
        make_face()
        with BuildLine():
            Line((33, 0), (31.548528137, -1.451471863))
            ThreePointArc((31.548528137, -1.451471863), (31.288400836, -2.759220119), (32.397056275, -3.5))
            Line((32.397056275, -3.5), (44.602943725, -3.5))
            ThreePointArc((44.602943725, -3.5), (45.711599164, -2.759220119), (45.451471863, -1.451471863))
            Line((45.451471863, -1.451471863), (44.329289322, -0.329289322))
            Line((44.329289322, -0.329289322), (49.897345602, -0.329289322))
            Line((49.897345602, -0.329289322), (49.897345602, -5.77544861))
            Line((49.897345602, -5.77544861), (28.682020132, -5.77544861))
            Line((28.682020132, -5.77544861), (28.682020132, 0))
            Line((28.682020132, 0), (33, 0))
        make_face()
    extrude(amount=-CUT_EXTRUDE2_DEPTH, mode=Mode.SUBTRACT)

    # Tap Drill for M2.5 Tap1
    with Locations(Plane.XZ.offset(10.5)):
        with Locations((-17.5, -4), (2.5, -4)):
            Hole(TAP_DRILL_FOR_M2_5_TAP1_D / 2, depth=TAP_DRILL_FOR_M2_5_TAP1_DEPTH)


solid = part.part
